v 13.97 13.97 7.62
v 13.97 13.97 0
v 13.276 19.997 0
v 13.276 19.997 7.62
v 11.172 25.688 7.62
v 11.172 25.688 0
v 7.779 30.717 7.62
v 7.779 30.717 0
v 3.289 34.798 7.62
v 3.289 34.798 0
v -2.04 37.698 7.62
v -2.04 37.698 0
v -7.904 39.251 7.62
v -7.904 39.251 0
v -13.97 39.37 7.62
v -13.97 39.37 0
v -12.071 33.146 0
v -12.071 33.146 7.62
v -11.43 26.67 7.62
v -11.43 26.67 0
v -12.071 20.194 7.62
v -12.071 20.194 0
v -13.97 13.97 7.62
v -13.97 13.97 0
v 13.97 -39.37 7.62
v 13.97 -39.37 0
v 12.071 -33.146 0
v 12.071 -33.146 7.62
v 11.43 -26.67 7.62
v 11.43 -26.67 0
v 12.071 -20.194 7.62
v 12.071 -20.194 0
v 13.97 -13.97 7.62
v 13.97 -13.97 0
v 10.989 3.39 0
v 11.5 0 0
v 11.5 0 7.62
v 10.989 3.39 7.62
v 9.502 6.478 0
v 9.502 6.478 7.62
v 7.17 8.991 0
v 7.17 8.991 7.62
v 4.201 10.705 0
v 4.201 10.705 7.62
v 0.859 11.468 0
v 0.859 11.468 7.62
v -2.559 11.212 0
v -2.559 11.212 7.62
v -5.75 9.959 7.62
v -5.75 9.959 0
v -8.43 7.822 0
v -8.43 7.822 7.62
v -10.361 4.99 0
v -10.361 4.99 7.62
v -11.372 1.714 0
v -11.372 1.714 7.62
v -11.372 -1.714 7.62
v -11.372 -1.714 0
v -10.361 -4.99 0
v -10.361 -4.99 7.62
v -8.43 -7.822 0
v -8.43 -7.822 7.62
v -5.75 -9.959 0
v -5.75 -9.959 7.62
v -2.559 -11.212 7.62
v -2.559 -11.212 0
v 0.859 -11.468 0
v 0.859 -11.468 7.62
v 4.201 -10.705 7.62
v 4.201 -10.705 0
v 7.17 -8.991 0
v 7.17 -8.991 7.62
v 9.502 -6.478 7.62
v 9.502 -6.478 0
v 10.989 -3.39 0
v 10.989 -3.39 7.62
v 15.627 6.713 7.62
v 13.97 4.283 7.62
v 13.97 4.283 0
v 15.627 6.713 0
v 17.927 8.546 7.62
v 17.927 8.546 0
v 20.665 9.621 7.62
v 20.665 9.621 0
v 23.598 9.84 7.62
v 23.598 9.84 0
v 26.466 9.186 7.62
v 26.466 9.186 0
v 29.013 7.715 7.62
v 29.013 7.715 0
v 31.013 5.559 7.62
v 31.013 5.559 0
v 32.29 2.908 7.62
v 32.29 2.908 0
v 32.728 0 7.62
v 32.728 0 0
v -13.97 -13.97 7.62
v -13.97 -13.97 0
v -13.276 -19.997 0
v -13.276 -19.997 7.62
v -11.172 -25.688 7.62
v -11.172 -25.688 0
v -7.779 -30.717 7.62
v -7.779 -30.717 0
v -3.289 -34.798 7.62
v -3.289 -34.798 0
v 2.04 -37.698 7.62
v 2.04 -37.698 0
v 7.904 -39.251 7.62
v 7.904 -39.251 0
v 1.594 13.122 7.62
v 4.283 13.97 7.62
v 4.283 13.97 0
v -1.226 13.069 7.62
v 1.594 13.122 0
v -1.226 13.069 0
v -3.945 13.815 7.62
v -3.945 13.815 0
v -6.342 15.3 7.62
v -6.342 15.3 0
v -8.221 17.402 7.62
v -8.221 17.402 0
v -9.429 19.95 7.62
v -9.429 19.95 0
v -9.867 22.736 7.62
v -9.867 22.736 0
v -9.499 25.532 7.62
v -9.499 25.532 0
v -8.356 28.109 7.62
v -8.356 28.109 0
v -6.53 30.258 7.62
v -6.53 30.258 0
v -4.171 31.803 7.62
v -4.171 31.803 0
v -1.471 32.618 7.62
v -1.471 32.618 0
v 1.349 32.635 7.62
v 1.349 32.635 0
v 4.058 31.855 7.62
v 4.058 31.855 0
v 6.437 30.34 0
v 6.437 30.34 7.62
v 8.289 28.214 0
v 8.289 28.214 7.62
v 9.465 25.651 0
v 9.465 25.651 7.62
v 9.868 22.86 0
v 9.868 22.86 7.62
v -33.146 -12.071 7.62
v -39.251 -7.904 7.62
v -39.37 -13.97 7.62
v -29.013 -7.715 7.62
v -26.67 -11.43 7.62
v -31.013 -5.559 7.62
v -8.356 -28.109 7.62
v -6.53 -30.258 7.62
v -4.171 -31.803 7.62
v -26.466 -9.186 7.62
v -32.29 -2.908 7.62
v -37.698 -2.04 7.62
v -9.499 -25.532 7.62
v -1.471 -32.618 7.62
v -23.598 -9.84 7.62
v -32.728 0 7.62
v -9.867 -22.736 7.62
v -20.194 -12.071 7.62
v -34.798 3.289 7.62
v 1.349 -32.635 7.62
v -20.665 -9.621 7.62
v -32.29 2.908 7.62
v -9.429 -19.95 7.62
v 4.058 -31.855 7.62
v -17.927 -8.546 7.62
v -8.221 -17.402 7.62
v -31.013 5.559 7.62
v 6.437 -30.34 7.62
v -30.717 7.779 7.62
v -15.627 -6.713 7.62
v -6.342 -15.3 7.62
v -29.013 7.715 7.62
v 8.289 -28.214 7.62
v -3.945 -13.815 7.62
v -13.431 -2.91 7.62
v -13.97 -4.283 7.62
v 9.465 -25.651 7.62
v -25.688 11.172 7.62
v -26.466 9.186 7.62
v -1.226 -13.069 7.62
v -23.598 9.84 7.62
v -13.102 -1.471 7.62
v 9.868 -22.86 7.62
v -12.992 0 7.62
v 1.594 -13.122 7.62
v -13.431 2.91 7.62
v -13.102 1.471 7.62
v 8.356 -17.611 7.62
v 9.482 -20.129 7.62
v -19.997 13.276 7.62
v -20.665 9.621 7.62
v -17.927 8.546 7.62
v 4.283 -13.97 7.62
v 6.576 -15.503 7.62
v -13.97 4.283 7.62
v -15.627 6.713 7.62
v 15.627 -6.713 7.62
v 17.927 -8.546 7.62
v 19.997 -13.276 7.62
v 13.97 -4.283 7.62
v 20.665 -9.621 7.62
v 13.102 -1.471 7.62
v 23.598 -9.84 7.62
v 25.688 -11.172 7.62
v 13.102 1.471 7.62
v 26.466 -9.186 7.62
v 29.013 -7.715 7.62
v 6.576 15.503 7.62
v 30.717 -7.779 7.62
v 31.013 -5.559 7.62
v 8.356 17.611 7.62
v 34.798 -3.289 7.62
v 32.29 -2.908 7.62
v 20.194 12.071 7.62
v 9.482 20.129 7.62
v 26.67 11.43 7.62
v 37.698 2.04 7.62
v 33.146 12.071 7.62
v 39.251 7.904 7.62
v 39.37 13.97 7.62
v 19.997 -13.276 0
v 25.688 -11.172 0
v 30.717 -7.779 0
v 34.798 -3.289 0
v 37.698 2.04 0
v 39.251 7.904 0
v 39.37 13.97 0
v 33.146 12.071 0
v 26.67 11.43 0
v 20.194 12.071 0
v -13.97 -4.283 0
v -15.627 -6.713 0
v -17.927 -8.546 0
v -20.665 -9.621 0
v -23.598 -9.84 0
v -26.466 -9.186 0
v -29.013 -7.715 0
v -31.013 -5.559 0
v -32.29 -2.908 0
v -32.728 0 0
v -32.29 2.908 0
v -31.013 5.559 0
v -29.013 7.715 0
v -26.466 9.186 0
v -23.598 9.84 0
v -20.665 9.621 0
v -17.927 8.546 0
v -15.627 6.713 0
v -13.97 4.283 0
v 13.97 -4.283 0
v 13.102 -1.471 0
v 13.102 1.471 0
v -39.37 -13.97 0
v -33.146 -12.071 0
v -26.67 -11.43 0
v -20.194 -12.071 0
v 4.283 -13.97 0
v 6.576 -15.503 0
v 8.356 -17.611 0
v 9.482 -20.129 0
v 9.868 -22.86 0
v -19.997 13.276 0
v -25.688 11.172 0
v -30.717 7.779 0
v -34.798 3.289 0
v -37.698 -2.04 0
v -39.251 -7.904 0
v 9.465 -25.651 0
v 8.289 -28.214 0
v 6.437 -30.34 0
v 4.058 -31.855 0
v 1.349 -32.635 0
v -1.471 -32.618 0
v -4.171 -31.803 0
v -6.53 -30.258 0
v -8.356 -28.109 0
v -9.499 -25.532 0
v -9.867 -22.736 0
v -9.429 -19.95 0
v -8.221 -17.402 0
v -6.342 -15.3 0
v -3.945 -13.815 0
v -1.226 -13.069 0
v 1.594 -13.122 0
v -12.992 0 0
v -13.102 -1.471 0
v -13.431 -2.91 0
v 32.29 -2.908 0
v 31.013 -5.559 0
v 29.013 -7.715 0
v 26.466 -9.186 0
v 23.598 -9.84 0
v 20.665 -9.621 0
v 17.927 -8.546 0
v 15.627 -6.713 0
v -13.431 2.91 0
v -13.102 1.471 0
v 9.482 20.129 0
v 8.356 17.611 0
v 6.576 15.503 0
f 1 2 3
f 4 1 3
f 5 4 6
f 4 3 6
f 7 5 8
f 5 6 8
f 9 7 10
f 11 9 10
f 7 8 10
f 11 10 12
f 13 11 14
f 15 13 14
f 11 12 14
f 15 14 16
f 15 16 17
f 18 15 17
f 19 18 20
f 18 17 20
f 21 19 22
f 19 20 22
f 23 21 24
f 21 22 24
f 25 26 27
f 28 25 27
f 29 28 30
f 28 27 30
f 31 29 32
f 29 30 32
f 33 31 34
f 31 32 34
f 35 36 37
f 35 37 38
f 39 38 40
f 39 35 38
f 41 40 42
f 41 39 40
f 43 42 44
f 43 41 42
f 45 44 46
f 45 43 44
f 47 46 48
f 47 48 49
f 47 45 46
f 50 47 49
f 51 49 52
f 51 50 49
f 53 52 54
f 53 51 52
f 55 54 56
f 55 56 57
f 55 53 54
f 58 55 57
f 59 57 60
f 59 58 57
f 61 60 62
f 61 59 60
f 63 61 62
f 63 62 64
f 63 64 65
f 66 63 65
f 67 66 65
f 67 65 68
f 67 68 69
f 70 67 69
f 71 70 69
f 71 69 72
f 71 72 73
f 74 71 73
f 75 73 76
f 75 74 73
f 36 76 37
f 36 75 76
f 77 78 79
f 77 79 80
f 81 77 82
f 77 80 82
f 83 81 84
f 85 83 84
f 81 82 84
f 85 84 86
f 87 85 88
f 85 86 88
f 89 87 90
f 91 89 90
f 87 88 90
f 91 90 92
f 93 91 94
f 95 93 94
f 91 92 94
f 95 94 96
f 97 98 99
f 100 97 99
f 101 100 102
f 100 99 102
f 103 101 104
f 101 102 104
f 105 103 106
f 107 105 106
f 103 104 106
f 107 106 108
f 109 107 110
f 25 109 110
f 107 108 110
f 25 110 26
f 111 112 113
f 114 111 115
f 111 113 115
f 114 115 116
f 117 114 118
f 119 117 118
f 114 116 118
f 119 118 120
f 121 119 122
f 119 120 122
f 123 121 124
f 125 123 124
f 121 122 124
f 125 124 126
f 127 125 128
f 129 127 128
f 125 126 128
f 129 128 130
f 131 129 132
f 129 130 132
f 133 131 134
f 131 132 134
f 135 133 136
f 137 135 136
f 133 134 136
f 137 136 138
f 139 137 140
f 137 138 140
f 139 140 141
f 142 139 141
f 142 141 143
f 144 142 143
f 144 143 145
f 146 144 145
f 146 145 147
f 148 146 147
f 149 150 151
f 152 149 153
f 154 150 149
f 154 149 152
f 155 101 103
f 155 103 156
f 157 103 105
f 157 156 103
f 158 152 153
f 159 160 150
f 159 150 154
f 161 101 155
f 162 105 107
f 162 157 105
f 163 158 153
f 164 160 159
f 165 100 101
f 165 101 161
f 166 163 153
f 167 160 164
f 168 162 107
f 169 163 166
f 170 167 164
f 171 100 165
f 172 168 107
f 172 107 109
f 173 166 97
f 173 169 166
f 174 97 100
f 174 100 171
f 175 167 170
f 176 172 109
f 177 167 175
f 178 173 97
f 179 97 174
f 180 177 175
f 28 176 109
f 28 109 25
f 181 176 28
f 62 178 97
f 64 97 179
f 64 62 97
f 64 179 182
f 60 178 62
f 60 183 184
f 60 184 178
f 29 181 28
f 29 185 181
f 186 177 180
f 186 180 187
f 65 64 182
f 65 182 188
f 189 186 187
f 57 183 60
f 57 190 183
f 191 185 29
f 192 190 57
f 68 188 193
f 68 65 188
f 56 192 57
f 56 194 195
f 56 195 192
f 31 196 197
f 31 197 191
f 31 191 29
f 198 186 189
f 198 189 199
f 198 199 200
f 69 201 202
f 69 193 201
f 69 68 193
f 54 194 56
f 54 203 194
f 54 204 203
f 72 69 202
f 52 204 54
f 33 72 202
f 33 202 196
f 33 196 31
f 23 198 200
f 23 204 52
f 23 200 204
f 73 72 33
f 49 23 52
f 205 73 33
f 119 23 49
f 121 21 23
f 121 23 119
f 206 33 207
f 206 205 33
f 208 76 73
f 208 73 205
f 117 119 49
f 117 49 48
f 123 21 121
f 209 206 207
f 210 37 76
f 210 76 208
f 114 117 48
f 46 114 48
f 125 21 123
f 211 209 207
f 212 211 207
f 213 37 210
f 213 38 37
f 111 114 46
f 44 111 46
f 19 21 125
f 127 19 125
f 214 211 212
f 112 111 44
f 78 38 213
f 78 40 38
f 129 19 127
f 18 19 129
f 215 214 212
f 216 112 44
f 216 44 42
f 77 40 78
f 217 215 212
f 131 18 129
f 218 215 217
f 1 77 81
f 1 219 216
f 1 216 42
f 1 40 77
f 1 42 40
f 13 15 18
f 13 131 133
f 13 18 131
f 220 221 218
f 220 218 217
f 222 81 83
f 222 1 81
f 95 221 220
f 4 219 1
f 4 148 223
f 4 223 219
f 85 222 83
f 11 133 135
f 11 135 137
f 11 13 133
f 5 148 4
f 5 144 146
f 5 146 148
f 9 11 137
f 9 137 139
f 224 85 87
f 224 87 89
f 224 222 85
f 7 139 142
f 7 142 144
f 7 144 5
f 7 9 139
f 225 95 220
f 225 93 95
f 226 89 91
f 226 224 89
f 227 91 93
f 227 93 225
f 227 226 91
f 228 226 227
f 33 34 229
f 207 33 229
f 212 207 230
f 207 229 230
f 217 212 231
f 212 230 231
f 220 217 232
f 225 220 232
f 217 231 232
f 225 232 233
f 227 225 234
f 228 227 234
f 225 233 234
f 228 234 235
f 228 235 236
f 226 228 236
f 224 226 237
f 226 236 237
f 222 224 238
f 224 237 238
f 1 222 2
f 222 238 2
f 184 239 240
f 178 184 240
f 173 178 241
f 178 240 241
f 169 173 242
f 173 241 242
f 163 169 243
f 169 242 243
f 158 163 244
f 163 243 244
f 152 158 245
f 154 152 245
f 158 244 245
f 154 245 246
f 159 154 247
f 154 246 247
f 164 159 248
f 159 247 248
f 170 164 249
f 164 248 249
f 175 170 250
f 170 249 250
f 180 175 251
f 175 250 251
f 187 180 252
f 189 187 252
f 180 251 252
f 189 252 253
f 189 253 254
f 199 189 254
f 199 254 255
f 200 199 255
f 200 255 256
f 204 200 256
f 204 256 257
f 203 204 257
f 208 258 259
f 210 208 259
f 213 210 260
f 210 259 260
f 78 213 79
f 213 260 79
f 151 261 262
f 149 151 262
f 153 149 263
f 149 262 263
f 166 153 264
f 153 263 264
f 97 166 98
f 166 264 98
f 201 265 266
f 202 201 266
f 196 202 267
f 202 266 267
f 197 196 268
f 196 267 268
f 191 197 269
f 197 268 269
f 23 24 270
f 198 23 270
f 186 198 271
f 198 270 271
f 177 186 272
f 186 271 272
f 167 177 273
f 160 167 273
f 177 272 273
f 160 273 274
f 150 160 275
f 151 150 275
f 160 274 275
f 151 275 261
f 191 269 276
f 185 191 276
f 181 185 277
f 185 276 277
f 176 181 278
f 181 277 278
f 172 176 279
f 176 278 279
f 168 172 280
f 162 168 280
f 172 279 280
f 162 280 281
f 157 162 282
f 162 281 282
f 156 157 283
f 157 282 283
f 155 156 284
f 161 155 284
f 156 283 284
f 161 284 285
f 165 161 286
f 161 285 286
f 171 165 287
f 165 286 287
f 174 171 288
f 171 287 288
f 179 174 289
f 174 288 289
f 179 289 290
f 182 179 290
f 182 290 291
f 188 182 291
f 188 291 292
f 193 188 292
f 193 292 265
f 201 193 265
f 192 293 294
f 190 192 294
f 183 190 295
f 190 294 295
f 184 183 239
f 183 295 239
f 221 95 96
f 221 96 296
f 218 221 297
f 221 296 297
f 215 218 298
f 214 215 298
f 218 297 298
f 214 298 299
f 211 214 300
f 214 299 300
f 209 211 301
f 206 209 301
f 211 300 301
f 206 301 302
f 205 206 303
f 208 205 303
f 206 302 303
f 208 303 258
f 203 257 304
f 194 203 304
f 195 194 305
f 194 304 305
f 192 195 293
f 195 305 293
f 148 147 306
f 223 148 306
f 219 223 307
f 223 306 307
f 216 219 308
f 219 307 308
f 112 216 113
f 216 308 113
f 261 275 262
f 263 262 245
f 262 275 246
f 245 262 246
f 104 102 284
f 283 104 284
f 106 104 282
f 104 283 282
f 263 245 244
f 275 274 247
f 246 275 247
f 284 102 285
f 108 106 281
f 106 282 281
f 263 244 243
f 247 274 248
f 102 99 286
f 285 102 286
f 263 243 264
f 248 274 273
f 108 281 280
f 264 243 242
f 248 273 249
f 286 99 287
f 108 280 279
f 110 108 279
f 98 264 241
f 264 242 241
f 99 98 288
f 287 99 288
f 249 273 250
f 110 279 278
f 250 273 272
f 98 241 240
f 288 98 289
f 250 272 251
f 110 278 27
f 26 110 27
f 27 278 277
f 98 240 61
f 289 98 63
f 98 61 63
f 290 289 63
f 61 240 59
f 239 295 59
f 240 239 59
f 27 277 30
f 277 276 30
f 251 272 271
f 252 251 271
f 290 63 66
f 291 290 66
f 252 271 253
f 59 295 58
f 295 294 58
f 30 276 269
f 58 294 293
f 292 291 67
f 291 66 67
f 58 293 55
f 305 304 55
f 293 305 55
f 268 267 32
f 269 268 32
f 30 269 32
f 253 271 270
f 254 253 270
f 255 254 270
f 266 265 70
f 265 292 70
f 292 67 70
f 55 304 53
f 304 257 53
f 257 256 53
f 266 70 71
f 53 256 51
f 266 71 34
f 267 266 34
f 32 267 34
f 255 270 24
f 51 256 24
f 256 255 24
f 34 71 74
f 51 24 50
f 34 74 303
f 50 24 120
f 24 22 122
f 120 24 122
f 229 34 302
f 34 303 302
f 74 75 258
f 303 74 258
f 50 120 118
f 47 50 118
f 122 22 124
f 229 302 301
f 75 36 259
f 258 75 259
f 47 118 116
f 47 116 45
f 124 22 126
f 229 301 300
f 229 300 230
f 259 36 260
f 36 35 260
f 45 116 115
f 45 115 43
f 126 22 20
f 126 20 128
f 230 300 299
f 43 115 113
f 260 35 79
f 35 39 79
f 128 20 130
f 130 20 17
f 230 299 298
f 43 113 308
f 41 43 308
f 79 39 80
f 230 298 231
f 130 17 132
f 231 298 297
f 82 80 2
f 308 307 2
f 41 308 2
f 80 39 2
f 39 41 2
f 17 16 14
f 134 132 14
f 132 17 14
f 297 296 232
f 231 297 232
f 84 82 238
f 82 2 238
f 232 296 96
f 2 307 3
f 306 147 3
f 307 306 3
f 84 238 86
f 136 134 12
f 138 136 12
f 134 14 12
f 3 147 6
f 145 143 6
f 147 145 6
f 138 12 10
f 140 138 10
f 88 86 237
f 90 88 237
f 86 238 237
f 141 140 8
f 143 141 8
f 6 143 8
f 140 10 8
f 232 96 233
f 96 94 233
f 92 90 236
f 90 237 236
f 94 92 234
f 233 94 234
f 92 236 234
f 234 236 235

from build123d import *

# Parameters (mm, degrees)
F0_R     = 11.5
F1_DEPTH = 7.62


with BuildPart() as f1:
    # F0 (on Top) → F1 (new body)
    with BuildSketch(Plane.XY):
        with BuildLine():
            Line((13.97, -4.2829137757), (13.97, -13.97))
            ThreePointArc((13.97, -13.97), (32.8918290507, -5.6562082279), (39.37, 13.97))
            ThreePointArc((39.37, 13.97), (26.67, 11.43), (13.97, 13.97))
            Line((13.97, 13.97), (13.97, 4.2829137757))
            ThreePointArc((13.97, 4.2829137757), (25.0565677101, 9.6203191582), (32.7279, 0))
            ThreePointArc((32.7279, 0), (25.0565677101, -9.6203191582), (13.97, -4.2829137757))
        make_face()
        with BuildLine():
            Line((4.2829137757, 13.97), (13.97, 13.97))
            ThreePointArc((13.97, 13.97), (5.6562082279, 32.8918290507), (-13.97, 39.37))
            ThreePointArc((-13.97, 39.37), (-11.43, 26.67), (-13.97, 13.97))
            Line((-13.97, 13.97), (-4.2829137757, 13.97))
            ThreePointArc((-4.2829137757, 13.97), (-5.2493849908, 31.2158008371), (9.8679, 22.86))
            ThreePointArc((9.8679, 22.86), (8.3558008371, 17.6106150092), (4.2829137757, 13.97))
        make_face()
        with BuildLine():
            ThreePointArc((-39.37, -13.97), (-26.67, -11.43), (-13.97, -13.97))
            Line((-13.97, -13.97), (-13.97, -4.2829137757))
            ThreePointArc((-13.97, -4.2829137757), (-32.7279, 0), (-13.97, 4.2829137757))
            Line((-13.97, 4.2829137757), (-13.97, 13.97))
            ThreePointArc((-13.97, 13.97), (-32.8918290507, 5.6562082279), (-39.37, -13.97))
        make_face()
        with BuildLine():
            Line((4.2829137757, -13.97), (13.97, -13.97))
            Line((13.97, -13.97), (13.97, -4.2829137757))
            ThreePointArc((13.97, -4.2829137757), (12.9921, 0), (13.97, 4.2829137757))
            Line((13.97, 4.2829137757), (13.97, 13.97))
            Line((13.97, 13.97), (4.2829137757, 13.97))
            ThreePointArc((4.2829137757, 13.97), (0, 12.9921), (-4.2829137757, 13.97))
            Line((-4.2829137757, 13.97), (-13.97, 13.97))
            Line((-13.97, 13.97), (-13.97, 4.2829137757))
            ThreePointArc((-13.97, 4.2829137757), (-13.2396808418, 2.1965677101), (-12.9921, 0))
            ThreePointArc((-12.9921, 0), (-13.2396808418, -2.1965677101), (-13.97, -4.2829137757))
            Line((-13.97, -4.2829137757), (-13.97, -13.97))
            Line((-13.97, -13.97), (-4.2829137757, -13.97))
            ThreePointArc((-4.2829137757, -13.97), (0, -12.9921), (4.2829137757, -13.97))
        make_face()
        Circle(F0_R, mode=Mode.SUBTRACT)
        with BuildLine():
            ThreePointArc((13.97, -39.37), (11.43, -26.67), (13.97, -13.97))
            Line((13.97, -13.97), (4.2829137757, -13.97))
            ThreePointArc((4.2829137757, -13.97), (8.3558008371, -17.6106150092), (9.8679, -22.86))
            ThreePointArc((9.8679, -22.86), (-5.2493849908, -31.2158008371), (-4.2829137757, -13.97))
            Line((-4.2829137757, -13.97), (-13.97, -13.97))
            ThreePointArc((-13.97, -13.97), (-5.6562082279, -32.8918290507), (13.97, -39.37))
        make_face()
    extrude(amount=F1_DEPTH)


solid = f1.part
